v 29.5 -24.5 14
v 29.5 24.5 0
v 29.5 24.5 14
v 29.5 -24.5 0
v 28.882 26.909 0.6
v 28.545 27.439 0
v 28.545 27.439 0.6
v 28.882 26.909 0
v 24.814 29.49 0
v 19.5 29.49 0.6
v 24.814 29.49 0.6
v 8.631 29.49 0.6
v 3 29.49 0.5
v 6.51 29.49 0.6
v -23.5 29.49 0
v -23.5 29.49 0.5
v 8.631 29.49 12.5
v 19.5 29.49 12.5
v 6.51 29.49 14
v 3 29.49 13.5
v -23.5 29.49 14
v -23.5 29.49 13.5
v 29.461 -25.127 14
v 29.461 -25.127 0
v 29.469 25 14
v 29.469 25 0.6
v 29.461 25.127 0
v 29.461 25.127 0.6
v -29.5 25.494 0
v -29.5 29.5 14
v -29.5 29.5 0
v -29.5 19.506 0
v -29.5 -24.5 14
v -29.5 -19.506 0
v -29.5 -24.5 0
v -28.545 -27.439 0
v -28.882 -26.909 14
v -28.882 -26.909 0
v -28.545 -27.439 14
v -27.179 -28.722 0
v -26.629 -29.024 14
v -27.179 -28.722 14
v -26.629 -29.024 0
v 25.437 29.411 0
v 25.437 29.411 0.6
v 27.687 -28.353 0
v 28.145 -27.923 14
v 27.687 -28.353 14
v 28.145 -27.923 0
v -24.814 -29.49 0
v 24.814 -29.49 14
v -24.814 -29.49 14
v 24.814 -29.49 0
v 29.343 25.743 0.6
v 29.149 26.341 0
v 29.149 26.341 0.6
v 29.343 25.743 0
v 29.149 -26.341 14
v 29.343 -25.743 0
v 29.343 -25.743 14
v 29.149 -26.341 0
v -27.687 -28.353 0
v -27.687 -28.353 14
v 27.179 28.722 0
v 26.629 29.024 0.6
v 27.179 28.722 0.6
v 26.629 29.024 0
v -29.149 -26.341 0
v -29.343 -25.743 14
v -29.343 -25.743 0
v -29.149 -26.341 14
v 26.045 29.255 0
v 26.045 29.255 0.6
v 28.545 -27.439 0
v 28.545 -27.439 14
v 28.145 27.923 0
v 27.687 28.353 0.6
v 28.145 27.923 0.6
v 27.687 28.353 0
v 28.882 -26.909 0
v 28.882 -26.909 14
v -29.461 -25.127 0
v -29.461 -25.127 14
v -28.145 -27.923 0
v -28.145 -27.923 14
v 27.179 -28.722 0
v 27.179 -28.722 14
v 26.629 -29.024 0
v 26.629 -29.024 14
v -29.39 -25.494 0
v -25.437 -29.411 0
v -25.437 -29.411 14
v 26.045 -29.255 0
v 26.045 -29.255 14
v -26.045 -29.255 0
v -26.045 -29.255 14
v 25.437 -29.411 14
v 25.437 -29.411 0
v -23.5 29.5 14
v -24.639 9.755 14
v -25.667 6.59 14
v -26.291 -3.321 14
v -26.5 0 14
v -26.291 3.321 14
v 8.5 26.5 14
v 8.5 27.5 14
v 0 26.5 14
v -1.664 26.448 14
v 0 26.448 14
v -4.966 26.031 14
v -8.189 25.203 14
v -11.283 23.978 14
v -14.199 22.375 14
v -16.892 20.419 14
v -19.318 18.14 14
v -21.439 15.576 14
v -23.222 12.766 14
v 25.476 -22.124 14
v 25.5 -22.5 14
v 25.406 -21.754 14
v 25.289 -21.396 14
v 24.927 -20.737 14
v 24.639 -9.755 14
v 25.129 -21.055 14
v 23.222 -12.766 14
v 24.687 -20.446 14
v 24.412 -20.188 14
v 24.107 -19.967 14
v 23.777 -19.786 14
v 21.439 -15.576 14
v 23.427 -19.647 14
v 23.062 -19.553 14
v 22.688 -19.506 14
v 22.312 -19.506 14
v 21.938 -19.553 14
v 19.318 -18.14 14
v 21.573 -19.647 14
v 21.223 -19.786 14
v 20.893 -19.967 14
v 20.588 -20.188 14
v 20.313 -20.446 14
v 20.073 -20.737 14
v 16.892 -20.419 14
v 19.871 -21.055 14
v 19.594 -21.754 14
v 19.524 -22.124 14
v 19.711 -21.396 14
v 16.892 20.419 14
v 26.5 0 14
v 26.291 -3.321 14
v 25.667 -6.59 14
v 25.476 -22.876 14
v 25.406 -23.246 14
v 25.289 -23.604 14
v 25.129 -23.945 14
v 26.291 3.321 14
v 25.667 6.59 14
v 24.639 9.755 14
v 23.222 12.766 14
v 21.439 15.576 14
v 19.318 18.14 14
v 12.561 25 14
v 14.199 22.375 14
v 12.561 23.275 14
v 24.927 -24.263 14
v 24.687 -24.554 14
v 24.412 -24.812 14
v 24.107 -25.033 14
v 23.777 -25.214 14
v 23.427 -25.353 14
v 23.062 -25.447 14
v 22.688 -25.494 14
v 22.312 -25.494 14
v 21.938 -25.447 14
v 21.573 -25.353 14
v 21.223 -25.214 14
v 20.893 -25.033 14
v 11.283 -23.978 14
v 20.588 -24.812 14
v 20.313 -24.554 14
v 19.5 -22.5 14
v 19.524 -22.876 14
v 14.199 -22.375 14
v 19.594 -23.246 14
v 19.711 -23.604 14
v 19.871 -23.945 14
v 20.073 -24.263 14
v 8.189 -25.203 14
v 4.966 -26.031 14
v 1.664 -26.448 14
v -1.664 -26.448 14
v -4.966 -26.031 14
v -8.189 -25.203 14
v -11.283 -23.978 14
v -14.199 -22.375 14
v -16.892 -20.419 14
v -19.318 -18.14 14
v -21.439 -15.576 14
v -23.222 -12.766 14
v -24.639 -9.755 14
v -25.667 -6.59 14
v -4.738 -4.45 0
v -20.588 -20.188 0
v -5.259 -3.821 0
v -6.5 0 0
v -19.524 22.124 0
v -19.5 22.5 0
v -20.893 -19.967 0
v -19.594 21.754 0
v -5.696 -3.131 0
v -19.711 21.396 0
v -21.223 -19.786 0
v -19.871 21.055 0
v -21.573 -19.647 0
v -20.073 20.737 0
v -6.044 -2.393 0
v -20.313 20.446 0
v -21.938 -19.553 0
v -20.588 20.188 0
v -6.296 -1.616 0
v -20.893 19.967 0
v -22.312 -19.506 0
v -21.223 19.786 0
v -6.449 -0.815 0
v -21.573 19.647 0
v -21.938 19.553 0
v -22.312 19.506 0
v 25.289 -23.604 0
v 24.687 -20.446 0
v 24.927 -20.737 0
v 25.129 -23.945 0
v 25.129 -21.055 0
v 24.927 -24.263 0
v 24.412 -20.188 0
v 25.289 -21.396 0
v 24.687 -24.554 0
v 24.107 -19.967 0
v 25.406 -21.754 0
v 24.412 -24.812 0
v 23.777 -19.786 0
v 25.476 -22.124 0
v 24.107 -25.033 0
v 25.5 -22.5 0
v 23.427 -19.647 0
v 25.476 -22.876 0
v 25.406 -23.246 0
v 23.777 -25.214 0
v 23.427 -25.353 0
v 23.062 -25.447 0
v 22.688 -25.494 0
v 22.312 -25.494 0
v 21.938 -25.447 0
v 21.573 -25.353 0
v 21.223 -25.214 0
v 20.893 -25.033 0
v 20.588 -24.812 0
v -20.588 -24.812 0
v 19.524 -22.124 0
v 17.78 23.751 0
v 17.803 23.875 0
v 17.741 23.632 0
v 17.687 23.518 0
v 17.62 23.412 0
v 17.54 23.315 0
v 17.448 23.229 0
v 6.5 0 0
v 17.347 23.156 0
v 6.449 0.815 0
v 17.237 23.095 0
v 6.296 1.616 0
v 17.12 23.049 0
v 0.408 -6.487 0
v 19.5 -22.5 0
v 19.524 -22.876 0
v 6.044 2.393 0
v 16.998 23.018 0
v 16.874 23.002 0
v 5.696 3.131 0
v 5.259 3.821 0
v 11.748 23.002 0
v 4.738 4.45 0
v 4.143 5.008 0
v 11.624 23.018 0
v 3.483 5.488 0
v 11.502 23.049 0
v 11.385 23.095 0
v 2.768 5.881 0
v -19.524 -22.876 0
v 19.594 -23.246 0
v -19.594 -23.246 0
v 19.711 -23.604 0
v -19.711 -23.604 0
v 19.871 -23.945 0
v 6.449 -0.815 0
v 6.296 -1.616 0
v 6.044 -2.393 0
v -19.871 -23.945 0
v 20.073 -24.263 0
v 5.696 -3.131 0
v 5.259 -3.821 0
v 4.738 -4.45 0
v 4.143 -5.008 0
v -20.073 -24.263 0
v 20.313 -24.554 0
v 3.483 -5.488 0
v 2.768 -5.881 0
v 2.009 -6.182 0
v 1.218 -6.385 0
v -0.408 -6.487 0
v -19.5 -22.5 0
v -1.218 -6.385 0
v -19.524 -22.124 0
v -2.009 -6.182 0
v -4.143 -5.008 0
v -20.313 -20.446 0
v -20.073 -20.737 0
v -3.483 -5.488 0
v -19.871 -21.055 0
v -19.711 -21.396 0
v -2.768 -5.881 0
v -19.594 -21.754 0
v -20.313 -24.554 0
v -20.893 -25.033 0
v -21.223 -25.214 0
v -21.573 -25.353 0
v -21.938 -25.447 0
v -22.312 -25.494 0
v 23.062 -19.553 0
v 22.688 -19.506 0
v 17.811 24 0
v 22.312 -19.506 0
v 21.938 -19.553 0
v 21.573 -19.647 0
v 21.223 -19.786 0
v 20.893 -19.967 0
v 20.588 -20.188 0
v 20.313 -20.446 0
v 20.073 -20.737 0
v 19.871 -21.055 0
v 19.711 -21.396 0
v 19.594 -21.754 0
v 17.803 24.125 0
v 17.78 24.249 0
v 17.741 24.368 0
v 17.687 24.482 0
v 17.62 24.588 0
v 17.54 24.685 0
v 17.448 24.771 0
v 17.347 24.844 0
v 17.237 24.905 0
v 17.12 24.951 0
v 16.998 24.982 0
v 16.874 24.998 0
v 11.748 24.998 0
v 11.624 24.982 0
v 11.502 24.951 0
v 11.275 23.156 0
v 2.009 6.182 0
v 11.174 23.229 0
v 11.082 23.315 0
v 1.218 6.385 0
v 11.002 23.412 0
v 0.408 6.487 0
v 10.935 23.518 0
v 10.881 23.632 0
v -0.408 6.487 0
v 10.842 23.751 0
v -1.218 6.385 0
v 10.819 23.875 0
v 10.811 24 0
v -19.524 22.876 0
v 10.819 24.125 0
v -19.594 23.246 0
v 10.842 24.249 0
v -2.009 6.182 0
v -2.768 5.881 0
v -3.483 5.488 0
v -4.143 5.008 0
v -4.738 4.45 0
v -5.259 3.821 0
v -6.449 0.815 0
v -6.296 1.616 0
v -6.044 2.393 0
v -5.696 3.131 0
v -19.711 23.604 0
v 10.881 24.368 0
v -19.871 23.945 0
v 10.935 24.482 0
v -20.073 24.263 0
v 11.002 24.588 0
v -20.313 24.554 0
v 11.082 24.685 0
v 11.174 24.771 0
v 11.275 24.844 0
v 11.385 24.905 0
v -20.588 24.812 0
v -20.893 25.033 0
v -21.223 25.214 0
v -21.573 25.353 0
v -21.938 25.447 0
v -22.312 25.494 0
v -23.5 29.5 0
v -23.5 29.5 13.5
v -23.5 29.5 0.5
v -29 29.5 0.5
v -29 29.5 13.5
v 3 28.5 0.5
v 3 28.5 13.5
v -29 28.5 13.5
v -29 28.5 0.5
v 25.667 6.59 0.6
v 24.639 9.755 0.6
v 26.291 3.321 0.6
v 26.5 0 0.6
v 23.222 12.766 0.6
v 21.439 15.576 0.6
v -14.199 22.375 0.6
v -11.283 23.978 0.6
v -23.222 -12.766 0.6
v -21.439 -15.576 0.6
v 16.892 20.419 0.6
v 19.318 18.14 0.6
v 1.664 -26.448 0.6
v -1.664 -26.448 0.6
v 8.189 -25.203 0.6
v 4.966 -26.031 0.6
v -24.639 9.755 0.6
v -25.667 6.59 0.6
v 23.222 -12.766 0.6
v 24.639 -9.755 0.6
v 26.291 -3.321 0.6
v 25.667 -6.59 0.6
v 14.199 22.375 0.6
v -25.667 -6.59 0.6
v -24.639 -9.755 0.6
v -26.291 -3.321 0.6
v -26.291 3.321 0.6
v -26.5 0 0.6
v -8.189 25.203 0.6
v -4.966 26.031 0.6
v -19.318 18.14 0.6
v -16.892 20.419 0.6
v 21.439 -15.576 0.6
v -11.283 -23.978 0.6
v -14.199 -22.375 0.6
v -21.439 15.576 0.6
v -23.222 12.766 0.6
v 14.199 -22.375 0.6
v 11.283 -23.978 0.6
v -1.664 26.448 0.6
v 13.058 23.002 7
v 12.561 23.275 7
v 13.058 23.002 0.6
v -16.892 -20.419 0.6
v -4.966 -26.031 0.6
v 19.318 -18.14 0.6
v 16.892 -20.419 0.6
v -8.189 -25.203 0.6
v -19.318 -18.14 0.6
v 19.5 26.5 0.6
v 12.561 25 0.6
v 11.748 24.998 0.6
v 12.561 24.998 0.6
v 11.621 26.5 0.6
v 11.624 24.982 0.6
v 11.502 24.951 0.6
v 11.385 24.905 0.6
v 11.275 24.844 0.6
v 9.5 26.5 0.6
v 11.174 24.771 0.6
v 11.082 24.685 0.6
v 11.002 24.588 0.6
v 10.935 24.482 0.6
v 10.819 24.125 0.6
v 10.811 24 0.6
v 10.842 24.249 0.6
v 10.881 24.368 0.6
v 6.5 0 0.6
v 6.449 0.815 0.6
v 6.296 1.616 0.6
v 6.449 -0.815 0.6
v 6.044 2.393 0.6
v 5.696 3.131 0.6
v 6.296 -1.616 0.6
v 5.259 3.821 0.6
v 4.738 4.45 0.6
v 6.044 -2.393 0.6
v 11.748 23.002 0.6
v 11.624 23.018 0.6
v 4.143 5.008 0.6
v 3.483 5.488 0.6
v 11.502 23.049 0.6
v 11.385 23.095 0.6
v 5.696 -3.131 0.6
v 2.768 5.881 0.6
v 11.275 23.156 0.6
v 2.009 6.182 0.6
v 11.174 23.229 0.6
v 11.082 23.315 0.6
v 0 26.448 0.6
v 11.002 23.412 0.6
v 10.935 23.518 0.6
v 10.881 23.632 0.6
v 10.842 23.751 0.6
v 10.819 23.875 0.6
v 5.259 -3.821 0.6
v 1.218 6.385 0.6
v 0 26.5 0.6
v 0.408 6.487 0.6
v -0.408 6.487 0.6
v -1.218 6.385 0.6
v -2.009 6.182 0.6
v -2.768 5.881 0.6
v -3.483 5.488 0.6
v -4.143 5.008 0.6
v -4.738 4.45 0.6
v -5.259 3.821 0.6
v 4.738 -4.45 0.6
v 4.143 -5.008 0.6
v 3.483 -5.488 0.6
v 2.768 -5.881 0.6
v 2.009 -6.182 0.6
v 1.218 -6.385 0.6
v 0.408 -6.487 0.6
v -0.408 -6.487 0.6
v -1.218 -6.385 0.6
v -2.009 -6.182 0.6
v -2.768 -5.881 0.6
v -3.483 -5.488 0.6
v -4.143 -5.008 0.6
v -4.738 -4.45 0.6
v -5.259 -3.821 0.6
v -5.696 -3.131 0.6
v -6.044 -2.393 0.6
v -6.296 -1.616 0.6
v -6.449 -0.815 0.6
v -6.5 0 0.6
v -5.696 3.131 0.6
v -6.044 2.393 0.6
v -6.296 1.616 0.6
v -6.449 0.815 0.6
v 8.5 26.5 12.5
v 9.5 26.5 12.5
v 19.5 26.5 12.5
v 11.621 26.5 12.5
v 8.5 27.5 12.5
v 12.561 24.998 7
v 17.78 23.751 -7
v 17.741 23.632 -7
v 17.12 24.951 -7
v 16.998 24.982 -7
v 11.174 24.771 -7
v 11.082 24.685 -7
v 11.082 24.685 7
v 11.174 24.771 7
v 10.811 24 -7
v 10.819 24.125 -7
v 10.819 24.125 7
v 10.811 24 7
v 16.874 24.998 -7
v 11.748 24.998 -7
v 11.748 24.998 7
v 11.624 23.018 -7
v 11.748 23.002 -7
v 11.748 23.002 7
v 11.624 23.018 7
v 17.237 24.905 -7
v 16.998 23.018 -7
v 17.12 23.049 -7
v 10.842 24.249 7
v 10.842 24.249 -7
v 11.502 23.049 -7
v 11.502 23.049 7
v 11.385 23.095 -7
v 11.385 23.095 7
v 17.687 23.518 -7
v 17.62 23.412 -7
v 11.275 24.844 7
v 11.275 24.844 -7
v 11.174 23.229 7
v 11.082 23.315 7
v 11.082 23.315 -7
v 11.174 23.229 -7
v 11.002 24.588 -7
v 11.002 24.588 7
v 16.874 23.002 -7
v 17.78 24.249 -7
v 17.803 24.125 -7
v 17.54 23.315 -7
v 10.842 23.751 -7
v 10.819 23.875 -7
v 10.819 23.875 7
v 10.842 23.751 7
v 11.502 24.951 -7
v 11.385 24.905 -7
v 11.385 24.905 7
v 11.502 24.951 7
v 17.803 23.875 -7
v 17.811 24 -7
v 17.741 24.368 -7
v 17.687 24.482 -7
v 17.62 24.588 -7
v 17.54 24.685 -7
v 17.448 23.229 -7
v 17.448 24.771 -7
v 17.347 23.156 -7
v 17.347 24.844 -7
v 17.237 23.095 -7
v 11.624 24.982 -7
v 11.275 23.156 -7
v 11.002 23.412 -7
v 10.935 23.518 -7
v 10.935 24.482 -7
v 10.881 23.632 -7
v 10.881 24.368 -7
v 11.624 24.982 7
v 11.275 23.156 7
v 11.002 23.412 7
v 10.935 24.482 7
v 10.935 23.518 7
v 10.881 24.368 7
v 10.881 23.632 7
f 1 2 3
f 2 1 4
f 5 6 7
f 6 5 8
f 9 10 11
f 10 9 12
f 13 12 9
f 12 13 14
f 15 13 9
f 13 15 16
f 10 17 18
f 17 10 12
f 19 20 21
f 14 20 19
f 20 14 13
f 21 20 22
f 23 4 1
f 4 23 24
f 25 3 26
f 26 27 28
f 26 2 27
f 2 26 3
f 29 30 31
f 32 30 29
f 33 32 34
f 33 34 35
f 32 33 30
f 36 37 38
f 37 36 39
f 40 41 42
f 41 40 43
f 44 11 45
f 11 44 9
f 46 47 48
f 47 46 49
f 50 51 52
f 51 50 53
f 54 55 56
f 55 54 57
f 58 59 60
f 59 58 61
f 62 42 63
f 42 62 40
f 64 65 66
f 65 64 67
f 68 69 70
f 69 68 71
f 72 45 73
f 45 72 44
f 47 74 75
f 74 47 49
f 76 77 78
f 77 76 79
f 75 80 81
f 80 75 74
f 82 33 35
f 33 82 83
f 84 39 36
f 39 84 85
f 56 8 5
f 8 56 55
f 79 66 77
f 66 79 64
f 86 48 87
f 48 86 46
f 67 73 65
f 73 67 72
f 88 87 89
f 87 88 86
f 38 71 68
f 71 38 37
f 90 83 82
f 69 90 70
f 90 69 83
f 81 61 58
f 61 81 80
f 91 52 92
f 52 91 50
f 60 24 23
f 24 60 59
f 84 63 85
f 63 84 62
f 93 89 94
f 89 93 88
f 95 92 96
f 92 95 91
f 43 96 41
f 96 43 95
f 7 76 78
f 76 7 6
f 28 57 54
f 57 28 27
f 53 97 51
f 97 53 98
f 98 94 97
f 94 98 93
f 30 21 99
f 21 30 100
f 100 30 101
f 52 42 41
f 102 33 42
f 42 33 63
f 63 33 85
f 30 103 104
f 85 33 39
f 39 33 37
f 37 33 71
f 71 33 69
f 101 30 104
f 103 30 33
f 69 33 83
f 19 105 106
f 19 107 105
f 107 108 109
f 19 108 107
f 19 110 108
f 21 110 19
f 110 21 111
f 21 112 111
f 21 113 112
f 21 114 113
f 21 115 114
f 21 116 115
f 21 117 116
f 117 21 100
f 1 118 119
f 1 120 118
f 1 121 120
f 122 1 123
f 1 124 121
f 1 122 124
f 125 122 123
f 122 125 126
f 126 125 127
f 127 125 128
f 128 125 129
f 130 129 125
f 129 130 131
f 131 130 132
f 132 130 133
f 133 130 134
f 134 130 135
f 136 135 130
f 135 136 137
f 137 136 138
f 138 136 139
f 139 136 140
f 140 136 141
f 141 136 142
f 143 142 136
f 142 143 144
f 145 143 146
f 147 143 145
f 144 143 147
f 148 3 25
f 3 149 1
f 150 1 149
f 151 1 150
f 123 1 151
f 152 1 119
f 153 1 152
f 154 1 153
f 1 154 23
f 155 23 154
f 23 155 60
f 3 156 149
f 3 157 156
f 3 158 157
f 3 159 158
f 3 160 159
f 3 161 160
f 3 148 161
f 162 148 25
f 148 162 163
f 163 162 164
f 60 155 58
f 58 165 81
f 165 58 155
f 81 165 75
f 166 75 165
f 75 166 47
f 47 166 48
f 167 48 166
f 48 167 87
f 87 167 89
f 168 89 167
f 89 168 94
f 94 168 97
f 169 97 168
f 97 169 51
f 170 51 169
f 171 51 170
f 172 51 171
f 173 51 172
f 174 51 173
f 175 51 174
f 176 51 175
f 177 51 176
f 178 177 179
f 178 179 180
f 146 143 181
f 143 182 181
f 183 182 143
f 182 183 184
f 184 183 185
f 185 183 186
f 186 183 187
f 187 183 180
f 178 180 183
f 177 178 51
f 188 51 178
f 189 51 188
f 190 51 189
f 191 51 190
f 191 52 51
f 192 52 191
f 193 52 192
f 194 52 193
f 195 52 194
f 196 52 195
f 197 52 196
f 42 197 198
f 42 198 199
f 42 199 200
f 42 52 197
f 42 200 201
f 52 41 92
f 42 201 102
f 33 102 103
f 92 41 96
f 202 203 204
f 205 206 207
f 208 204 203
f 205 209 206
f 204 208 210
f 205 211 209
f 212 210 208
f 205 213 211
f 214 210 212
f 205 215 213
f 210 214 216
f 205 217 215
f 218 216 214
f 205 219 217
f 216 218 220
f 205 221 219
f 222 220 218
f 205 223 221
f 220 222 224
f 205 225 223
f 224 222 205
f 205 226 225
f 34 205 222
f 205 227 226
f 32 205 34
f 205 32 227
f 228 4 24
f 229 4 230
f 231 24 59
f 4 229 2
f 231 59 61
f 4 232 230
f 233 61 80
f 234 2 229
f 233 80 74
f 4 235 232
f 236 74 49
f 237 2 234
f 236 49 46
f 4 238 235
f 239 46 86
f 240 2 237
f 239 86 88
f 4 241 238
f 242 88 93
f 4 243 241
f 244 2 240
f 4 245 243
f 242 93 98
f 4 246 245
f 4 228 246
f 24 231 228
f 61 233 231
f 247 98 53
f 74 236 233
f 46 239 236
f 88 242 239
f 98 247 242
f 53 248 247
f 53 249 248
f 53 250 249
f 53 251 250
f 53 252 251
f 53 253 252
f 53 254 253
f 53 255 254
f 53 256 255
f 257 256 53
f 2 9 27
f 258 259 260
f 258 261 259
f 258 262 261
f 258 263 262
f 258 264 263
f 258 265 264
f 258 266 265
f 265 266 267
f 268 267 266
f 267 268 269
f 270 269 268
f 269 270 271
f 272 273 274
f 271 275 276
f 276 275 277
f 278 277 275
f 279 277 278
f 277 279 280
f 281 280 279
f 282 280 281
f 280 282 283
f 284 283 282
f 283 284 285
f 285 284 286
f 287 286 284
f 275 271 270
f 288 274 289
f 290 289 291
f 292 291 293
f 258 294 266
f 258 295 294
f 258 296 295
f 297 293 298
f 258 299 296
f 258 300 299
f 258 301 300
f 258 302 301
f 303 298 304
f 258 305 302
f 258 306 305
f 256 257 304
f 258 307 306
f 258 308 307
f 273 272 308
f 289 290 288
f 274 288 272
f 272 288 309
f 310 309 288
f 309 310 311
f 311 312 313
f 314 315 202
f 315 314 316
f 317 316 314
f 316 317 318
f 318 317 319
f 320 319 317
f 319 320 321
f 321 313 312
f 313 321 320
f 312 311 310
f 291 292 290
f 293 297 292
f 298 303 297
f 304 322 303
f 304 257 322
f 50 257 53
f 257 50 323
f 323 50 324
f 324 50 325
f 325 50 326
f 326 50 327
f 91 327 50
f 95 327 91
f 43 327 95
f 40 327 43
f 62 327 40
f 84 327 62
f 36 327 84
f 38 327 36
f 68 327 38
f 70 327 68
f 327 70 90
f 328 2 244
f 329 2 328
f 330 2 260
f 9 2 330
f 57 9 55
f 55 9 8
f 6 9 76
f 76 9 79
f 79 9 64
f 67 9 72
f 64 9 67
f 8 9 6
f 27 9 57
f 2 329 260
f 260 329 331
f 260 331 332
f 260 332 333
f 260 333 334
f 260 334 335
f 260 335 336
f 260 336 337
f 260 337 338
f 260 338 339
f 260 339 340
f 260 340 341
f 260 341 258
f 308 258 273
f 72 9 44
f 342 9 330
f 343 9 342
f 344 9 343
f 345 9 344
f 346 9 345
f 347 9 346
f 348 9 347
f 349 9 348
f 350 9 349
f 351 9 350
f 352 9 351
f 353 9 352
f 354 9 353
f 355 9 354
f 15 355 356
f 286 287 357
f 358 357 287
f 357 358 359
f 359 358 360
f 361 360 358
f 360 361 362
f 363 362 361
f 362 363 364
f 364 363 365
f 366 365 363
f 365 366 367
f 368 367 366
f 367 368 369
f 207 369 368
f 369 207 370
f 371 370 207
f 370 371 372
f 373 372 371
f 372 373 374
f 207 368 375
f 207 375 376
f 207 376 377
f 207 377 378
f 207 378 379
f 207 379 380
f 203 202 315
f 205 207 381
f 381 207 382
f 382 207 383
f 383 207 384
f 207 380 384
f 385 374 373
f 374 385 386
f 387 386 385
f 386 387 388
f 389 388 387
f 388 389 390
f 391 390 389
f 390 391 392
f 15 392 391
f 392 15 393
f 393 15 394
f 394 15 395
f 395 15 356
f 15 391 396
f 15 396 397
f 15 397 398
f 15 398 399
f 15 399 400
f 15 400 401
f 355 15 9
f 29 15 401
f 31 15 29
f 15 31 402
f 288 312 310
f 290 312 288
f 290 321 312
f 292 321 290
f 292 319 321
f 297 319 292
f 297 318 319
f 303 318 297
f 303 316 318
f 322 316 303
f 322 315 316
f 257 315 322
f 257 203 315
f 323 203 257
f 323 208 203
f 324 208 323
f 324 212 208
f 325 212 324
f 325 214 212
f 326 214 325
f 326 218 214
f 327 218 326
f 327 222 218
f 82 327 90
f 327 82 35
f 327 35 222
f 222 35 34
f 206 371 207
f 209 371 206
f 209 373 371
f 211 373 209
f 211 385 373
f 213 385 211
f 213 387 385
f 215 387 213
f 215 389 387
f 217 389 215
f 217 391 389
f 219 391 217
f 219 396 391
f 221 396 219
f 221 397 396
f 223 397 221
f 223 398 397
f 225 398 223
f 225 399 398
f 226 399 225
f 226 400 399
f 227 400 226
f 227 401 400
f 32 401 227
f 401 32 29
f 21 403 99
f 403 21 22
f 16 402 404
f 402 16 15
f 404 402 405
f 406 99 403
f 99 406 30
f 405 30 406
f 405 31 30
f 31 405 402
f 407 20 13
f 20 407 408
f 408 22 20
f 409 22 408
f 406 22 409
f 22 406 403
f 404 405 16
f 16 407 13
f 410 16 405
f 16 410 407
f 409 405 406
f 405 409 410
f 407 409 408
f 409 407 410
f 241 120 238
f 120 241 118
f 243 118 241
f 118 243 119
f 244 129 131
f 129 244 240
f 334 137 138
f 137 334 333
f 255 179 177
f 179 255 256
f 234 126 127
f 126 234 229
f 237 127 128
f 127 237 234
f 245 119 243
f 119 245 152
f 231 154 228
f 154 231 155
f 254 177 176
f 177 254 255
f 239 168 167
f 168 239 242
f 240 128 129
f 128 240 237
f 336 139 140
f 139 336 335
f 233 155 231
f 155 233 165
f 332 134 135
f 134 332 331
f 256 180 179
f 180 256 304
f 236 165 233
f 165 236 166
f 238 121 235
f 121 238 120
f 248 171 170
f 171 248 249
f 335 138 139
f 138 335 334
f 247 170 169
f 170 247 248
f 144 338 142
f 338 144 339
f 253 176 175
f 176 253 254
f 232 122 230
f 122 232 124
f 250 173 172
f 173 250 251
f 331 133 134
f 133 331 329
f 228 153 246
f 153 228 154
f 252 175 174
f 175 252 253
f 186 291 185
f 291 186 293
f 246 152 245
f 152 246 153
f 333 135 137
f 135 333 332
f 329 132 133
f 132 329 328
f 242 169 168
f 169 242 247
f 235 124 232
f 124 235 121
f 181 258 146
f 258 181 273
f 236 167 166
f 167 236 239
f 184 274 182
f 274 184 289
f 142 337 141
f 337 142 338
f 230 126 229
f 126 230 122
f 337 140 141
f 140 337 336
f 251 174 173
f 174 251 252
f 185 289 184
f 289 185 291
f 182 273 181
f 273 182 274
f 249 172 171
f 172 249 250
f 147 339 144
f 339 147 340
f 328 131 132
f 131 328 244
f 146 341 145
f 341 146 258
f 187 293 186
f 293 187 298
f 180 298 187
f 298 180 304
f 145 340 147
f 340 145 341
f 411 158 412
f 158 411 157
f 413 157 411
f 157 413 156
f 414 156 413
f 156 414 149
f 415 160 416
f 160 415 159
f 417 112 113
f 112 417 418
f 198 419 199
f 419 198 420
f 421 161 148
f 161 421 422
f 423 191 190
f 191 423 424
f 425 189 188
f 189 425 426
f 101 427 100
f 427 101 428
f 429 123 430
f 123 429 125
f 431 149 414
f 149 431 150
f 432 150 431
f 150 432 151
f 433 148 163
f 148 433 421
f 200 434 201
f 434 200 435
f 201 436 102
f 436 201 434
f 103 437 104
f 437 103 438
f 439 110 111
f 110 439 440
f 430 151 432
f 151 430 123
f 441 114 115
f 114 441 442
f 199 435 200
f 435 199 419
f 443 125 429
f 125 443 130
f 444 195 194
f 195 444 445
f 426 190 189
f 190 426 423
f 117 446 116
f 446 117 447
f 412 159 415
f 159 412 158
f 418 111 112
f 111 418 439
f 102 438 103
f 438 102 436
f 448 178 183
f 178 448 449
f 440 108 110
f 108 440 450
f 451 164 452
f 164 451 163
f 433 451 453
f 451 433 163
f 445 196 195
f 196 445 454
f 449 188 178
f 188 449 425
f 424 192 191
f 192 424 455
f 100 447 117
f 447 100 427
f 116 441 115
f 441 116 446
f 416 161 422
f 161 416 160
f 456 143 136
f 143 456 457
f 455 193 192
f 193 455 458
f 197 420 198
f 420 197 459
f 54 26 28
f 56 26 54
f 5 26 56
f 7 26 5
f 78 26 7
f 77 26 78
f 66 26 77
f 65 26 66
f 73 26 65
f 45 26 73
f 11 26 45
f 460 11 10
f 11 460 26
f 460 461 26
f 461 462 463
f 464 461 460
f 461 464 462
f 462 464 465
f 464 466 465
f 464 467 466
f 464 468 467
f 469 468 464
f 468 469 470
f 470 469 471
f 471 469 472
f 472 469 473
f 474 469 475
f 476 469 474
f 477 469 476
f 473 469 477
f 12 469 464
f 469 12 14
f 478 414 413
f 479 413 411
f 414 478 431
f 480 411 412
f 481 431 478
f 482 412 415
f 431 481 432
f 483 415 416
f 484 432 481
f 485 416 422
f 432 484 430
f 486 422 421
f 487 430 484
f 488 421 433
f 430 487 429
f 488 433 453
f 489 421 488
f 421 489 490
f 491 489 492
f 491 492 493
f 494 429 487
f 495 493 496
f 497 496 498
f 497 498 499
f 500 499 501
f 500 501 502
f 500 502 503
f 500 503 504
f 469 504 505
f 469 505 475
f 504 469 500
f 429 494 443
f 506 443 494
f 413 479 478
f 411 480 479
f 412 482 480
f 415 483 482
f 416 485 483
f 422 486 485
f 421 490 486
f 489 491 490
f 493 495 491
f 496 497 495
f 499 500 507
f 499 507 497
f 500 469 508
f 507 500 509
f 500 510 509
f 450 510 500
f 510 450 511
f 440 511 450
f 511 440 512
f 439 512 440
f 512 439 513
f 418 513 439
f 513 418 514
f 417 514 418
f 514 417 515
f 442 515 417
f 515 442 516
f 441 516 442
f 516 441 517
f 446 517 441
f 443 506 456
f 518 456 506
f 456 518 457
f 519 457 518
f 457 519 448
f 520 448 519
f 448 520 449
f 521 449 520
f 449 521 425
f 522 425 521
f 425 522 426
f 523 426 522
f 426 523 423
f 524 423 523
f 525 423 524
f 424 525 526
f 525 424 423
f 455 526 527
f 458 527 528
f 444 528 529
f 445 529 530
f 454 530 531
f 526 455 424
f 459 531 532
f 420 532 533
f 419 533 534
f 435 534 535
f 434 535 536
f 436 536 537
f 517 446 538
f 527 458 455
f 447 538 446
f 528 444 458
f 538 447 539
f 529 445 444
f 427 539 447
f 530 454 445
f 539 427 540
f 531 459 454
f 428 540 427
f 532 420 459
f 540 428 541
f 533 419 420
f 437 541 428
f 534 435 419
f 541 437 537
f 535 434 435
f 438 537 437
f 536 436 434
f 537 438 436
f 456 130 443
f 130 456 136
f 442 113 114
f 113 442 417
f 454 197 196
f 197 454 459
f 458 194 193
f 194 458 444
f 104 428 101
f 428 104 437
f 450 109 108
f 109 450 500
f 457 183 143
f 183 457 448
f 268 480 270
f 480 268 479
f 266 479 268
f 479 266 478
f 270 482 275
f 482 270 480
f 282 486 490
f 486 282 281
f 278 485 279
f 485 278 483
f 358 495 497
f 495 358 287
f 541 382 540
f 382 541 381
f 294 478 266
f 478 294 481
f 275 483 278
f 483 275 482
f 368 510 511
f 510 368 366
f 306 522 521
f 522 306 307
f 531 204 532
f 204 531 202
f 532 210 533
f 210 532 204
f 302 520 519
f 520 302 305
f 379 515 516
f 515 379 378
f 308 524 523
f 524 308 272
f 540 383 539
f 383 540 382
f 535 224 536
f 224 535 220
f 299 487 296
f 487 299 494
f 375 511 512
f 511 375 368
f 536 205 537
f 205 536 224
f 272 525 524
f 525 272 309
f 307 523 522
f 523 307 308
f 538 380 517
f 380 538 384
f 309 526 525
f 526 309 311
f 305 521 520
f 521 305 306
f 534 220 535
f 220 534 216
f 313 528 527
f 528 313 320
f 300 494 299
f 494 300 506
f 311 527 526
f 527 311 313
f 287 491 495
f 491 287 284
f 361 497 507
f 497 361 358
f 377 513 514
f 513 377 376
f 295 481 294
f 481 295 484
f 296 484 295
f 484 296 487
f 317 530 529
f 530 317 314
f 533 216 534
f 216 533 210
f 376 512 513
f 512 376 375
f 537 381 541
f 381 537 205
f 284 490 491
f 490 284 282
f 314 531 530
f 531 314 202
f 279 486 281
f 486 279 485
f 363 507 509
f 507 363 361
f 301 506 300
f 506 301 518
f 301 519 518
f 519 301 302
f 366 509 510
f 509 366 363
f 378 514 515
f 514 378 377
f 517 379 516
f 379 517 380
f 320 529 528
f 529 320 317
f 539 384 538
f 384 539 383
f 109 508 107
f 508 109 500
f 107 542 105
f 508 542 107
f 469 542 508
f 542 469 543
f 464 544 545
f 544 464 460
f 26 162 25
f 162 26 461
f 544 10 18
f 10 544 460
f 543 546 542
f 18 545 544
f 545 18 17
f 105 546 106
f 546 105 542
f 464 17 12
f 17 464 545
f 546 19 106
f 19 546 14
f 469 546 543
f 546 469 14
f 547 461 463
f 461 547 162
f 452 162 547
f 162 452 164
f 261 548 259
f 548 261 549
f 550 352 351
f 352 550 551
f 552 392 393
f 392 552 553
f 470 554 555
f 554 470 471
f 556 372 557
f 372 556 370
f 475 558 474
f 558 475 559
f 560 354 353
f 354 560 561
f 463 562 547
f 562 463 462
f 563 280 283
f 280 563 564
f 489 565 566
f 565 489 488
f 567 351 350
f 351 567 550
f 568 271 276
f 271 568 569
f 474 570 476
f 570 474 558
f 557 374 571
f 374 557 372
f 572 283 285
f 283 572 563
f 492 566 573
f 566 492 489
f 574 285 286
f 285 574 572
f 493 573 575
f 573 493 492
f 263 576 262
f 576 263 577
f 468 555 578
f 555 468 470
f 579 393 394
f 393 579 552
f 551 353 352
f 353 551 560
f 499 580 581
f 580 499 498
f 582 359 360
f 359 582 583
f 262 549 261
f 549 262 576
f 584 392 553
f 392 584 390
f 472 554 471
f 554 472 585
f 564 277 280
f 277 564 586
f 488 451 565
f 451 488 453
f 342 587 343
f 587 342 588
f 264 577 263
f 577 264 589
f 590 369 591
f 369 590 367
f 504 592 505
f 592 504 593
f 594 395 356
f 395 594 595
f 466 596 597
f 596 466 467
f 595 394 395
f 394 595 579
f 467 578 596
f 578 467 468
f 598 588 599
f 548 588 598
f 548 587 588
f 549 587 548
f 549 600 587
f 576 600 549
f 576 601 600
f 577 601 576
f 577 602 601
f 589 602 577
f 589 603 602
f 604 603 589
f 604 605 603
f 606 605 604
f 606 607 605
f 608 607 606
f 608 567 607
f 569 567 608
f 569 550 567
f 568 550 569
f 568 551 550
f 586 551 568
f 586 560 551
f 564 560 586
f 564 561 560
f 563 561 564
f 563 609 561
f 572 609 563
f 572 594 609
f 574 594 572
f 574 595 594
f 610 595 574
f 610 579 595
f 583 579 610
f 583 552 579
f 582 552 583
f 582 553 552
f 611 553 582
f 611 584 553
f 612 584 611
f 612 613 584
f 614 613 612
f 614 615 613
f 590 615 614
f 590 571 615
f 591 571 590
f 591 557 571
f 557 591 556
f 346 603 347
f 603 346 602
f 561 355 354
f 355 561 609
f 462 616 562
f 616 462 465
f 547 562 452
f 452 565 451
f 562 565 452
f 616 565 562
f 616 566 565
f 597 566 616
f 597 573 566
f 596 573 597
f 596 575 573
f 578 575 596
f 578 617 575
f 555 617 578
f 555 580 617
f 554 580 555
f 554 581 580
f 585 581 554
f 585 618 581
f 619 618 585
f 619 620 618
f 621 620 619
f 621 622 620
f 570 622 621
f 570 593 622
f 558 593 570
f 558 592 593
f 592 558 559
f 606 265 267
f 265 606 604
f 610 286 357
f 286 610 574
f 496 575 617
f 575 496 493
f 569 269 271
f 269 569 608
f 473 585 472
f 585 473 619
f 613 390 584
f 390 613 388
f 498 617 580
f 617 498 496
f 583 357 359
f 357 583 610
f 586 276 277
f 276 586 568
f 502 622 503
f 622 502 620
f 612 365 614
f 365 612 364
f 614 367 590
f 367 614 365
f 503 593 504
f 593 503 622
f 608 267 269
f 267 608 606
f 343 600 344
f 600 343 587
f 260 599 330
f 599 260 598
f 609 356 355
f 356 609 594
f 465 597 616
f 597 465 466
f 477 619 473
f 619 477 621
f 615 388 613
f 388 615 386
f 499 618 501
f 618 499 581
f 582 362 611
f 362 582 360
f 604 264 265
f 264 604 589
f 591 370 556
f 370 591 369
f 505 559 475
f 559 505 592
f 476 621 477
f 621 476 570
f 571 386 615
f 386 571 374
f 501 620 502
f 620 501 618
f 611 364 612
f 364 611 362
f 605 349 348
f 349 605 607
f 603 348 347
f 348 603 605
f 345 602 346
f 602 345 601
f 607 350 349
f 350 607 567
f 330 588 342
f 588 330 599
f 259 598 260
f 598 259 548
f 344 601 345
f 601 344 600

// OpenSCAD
$fn = 50;


union() {
	difference() {
		union() {
			hull() {
				translate(v = [-24.5000000000, 24.5000000000, 0]) {
					cylinder(h = 14, r = 5);
				}
				translate(v = [24.5000000000, 24.5000000000, 0]) {
					cylinder(h = 14, r = 5);
				}
				translate(v = [-24.5000000000, -24.5000000000, 0]) {
					cylinder(h = 14, r = 5);
				}
				translate(v = [24.5000000000, -24.5000000000, 0]) {
					cylinder(h = 14, r = 5);
				}
			}
			translate(v = [-29.5000000000, 23.5000000000, 0]) {
				cube(size = [6, 6, 14]);
			}
		}
		union() {
			translate(v = [-30.0000000000, -22.5000000000, -250.0000000000]) {
				rotate(a = [0, 0, 0]) {
					difference() {
						union() {
							hull() {
								translate(v = [7.5000000000, 0, 0]) {
									cylinder(h = 250, r = 3.0000000000, r1 = 3.0000000000, r2 = 3.0000000000);
								}
								translate(v = [-7.5000000000, 0, 0]) {
									cylinder(h = 250, r = 3.0000000000, r1 = 3.0000000000, r2 = 3.0000000000);
								}
							}
						}
						union();
					}
				}
			}
			translate(v = [-30.0000000000, 22.5000000000, -250.0000000000]) {
				rotate(a = [0, 0, 0]) {
					difference() {
						union() {
							hull() {
								translate(v = [7.5000000000, 0, 0]) {
									cylinder(h = 250, r = 3.0000000000, r1 = 3.0000000000, r2 = 3.0000000000);
								}
								translate(v = [-7.5000000000, 0, 0]) {
									cylinder(h = 250, r = 3.0000000000, r1 = 3.0000000000, r2 = 3.0000000000);
								}
							}
						}
						union();
					}
				}
			}
			translate(v = [-29.0000000000, 28.5000000000, 0.5000000000]) {
				cube(size = [32, 1, 13.0000000000]);
			}
			translate(v = [22.5000000000, -22.5000000000, 0]) {
				cylinder(h = 100, r = 3.0000000000);
			}
			translate(v = [0, 0, 0.6000000000]) {
				cylinder(h = 16.4000000000, r = 26.5000000000);
			}
			translate(v = [0, 0, -7.0000000000]) {
				cylinder(h = 14, r = 6.5000000000);
			}
			translate(v = [0.0000000000, 25.0000000000, 0.6000000000]) {
				cube(size = [29.5000000000, 1.5000000000, 16.4000000000]);
			}
			translate(v = [19.5000000000, 25.0000000000, 0.6000000000]) {
				cube(size = [10, 4.5000000000, 16.4000000000]);
			}
			translate(v = [8.5000000000, 25.0000000000, 12.5000000000]) {
				cube(size = [21, 4.5000000000, 1.5000000000]);
			}
			translate(v = [5.7500000000, 30.2500000000, 0.6000000000]) {
				rotate(a = [0, 0, -45]) {
					cube(size = [7.5000000000, 1.5000000000, 16.4000000000]);
				}
			}
			translate(v = [5.0610000000, 23.0000000000, 0.6000000000]) {
				cube(size = [7.5000000000, 2, 13.4000000000]);
			}
		}
	}
	union() {
		translate(v = [14.3110000000, 24.0000000000, -7.0000000000]) {
			rotate(a = [0, 0, 0]) {
				difference() {
					union() {
						#hull() {
							#translate(v = [2.5000000000, 0, 0]) {
								cylinder(h = 14, r = 1.0000000000, r1 = 1.0000000000, r2 = 1.0000000000);
							}
							#translate(v = [-2.5000000000, 0, 0]) {
								cylinder(h = 14, r = 1.0000000000, r1 = 1.0000000000, r2 = 1.0000000000);
							}
						}
					}
					union();
				}
			}
		}
	}
}
